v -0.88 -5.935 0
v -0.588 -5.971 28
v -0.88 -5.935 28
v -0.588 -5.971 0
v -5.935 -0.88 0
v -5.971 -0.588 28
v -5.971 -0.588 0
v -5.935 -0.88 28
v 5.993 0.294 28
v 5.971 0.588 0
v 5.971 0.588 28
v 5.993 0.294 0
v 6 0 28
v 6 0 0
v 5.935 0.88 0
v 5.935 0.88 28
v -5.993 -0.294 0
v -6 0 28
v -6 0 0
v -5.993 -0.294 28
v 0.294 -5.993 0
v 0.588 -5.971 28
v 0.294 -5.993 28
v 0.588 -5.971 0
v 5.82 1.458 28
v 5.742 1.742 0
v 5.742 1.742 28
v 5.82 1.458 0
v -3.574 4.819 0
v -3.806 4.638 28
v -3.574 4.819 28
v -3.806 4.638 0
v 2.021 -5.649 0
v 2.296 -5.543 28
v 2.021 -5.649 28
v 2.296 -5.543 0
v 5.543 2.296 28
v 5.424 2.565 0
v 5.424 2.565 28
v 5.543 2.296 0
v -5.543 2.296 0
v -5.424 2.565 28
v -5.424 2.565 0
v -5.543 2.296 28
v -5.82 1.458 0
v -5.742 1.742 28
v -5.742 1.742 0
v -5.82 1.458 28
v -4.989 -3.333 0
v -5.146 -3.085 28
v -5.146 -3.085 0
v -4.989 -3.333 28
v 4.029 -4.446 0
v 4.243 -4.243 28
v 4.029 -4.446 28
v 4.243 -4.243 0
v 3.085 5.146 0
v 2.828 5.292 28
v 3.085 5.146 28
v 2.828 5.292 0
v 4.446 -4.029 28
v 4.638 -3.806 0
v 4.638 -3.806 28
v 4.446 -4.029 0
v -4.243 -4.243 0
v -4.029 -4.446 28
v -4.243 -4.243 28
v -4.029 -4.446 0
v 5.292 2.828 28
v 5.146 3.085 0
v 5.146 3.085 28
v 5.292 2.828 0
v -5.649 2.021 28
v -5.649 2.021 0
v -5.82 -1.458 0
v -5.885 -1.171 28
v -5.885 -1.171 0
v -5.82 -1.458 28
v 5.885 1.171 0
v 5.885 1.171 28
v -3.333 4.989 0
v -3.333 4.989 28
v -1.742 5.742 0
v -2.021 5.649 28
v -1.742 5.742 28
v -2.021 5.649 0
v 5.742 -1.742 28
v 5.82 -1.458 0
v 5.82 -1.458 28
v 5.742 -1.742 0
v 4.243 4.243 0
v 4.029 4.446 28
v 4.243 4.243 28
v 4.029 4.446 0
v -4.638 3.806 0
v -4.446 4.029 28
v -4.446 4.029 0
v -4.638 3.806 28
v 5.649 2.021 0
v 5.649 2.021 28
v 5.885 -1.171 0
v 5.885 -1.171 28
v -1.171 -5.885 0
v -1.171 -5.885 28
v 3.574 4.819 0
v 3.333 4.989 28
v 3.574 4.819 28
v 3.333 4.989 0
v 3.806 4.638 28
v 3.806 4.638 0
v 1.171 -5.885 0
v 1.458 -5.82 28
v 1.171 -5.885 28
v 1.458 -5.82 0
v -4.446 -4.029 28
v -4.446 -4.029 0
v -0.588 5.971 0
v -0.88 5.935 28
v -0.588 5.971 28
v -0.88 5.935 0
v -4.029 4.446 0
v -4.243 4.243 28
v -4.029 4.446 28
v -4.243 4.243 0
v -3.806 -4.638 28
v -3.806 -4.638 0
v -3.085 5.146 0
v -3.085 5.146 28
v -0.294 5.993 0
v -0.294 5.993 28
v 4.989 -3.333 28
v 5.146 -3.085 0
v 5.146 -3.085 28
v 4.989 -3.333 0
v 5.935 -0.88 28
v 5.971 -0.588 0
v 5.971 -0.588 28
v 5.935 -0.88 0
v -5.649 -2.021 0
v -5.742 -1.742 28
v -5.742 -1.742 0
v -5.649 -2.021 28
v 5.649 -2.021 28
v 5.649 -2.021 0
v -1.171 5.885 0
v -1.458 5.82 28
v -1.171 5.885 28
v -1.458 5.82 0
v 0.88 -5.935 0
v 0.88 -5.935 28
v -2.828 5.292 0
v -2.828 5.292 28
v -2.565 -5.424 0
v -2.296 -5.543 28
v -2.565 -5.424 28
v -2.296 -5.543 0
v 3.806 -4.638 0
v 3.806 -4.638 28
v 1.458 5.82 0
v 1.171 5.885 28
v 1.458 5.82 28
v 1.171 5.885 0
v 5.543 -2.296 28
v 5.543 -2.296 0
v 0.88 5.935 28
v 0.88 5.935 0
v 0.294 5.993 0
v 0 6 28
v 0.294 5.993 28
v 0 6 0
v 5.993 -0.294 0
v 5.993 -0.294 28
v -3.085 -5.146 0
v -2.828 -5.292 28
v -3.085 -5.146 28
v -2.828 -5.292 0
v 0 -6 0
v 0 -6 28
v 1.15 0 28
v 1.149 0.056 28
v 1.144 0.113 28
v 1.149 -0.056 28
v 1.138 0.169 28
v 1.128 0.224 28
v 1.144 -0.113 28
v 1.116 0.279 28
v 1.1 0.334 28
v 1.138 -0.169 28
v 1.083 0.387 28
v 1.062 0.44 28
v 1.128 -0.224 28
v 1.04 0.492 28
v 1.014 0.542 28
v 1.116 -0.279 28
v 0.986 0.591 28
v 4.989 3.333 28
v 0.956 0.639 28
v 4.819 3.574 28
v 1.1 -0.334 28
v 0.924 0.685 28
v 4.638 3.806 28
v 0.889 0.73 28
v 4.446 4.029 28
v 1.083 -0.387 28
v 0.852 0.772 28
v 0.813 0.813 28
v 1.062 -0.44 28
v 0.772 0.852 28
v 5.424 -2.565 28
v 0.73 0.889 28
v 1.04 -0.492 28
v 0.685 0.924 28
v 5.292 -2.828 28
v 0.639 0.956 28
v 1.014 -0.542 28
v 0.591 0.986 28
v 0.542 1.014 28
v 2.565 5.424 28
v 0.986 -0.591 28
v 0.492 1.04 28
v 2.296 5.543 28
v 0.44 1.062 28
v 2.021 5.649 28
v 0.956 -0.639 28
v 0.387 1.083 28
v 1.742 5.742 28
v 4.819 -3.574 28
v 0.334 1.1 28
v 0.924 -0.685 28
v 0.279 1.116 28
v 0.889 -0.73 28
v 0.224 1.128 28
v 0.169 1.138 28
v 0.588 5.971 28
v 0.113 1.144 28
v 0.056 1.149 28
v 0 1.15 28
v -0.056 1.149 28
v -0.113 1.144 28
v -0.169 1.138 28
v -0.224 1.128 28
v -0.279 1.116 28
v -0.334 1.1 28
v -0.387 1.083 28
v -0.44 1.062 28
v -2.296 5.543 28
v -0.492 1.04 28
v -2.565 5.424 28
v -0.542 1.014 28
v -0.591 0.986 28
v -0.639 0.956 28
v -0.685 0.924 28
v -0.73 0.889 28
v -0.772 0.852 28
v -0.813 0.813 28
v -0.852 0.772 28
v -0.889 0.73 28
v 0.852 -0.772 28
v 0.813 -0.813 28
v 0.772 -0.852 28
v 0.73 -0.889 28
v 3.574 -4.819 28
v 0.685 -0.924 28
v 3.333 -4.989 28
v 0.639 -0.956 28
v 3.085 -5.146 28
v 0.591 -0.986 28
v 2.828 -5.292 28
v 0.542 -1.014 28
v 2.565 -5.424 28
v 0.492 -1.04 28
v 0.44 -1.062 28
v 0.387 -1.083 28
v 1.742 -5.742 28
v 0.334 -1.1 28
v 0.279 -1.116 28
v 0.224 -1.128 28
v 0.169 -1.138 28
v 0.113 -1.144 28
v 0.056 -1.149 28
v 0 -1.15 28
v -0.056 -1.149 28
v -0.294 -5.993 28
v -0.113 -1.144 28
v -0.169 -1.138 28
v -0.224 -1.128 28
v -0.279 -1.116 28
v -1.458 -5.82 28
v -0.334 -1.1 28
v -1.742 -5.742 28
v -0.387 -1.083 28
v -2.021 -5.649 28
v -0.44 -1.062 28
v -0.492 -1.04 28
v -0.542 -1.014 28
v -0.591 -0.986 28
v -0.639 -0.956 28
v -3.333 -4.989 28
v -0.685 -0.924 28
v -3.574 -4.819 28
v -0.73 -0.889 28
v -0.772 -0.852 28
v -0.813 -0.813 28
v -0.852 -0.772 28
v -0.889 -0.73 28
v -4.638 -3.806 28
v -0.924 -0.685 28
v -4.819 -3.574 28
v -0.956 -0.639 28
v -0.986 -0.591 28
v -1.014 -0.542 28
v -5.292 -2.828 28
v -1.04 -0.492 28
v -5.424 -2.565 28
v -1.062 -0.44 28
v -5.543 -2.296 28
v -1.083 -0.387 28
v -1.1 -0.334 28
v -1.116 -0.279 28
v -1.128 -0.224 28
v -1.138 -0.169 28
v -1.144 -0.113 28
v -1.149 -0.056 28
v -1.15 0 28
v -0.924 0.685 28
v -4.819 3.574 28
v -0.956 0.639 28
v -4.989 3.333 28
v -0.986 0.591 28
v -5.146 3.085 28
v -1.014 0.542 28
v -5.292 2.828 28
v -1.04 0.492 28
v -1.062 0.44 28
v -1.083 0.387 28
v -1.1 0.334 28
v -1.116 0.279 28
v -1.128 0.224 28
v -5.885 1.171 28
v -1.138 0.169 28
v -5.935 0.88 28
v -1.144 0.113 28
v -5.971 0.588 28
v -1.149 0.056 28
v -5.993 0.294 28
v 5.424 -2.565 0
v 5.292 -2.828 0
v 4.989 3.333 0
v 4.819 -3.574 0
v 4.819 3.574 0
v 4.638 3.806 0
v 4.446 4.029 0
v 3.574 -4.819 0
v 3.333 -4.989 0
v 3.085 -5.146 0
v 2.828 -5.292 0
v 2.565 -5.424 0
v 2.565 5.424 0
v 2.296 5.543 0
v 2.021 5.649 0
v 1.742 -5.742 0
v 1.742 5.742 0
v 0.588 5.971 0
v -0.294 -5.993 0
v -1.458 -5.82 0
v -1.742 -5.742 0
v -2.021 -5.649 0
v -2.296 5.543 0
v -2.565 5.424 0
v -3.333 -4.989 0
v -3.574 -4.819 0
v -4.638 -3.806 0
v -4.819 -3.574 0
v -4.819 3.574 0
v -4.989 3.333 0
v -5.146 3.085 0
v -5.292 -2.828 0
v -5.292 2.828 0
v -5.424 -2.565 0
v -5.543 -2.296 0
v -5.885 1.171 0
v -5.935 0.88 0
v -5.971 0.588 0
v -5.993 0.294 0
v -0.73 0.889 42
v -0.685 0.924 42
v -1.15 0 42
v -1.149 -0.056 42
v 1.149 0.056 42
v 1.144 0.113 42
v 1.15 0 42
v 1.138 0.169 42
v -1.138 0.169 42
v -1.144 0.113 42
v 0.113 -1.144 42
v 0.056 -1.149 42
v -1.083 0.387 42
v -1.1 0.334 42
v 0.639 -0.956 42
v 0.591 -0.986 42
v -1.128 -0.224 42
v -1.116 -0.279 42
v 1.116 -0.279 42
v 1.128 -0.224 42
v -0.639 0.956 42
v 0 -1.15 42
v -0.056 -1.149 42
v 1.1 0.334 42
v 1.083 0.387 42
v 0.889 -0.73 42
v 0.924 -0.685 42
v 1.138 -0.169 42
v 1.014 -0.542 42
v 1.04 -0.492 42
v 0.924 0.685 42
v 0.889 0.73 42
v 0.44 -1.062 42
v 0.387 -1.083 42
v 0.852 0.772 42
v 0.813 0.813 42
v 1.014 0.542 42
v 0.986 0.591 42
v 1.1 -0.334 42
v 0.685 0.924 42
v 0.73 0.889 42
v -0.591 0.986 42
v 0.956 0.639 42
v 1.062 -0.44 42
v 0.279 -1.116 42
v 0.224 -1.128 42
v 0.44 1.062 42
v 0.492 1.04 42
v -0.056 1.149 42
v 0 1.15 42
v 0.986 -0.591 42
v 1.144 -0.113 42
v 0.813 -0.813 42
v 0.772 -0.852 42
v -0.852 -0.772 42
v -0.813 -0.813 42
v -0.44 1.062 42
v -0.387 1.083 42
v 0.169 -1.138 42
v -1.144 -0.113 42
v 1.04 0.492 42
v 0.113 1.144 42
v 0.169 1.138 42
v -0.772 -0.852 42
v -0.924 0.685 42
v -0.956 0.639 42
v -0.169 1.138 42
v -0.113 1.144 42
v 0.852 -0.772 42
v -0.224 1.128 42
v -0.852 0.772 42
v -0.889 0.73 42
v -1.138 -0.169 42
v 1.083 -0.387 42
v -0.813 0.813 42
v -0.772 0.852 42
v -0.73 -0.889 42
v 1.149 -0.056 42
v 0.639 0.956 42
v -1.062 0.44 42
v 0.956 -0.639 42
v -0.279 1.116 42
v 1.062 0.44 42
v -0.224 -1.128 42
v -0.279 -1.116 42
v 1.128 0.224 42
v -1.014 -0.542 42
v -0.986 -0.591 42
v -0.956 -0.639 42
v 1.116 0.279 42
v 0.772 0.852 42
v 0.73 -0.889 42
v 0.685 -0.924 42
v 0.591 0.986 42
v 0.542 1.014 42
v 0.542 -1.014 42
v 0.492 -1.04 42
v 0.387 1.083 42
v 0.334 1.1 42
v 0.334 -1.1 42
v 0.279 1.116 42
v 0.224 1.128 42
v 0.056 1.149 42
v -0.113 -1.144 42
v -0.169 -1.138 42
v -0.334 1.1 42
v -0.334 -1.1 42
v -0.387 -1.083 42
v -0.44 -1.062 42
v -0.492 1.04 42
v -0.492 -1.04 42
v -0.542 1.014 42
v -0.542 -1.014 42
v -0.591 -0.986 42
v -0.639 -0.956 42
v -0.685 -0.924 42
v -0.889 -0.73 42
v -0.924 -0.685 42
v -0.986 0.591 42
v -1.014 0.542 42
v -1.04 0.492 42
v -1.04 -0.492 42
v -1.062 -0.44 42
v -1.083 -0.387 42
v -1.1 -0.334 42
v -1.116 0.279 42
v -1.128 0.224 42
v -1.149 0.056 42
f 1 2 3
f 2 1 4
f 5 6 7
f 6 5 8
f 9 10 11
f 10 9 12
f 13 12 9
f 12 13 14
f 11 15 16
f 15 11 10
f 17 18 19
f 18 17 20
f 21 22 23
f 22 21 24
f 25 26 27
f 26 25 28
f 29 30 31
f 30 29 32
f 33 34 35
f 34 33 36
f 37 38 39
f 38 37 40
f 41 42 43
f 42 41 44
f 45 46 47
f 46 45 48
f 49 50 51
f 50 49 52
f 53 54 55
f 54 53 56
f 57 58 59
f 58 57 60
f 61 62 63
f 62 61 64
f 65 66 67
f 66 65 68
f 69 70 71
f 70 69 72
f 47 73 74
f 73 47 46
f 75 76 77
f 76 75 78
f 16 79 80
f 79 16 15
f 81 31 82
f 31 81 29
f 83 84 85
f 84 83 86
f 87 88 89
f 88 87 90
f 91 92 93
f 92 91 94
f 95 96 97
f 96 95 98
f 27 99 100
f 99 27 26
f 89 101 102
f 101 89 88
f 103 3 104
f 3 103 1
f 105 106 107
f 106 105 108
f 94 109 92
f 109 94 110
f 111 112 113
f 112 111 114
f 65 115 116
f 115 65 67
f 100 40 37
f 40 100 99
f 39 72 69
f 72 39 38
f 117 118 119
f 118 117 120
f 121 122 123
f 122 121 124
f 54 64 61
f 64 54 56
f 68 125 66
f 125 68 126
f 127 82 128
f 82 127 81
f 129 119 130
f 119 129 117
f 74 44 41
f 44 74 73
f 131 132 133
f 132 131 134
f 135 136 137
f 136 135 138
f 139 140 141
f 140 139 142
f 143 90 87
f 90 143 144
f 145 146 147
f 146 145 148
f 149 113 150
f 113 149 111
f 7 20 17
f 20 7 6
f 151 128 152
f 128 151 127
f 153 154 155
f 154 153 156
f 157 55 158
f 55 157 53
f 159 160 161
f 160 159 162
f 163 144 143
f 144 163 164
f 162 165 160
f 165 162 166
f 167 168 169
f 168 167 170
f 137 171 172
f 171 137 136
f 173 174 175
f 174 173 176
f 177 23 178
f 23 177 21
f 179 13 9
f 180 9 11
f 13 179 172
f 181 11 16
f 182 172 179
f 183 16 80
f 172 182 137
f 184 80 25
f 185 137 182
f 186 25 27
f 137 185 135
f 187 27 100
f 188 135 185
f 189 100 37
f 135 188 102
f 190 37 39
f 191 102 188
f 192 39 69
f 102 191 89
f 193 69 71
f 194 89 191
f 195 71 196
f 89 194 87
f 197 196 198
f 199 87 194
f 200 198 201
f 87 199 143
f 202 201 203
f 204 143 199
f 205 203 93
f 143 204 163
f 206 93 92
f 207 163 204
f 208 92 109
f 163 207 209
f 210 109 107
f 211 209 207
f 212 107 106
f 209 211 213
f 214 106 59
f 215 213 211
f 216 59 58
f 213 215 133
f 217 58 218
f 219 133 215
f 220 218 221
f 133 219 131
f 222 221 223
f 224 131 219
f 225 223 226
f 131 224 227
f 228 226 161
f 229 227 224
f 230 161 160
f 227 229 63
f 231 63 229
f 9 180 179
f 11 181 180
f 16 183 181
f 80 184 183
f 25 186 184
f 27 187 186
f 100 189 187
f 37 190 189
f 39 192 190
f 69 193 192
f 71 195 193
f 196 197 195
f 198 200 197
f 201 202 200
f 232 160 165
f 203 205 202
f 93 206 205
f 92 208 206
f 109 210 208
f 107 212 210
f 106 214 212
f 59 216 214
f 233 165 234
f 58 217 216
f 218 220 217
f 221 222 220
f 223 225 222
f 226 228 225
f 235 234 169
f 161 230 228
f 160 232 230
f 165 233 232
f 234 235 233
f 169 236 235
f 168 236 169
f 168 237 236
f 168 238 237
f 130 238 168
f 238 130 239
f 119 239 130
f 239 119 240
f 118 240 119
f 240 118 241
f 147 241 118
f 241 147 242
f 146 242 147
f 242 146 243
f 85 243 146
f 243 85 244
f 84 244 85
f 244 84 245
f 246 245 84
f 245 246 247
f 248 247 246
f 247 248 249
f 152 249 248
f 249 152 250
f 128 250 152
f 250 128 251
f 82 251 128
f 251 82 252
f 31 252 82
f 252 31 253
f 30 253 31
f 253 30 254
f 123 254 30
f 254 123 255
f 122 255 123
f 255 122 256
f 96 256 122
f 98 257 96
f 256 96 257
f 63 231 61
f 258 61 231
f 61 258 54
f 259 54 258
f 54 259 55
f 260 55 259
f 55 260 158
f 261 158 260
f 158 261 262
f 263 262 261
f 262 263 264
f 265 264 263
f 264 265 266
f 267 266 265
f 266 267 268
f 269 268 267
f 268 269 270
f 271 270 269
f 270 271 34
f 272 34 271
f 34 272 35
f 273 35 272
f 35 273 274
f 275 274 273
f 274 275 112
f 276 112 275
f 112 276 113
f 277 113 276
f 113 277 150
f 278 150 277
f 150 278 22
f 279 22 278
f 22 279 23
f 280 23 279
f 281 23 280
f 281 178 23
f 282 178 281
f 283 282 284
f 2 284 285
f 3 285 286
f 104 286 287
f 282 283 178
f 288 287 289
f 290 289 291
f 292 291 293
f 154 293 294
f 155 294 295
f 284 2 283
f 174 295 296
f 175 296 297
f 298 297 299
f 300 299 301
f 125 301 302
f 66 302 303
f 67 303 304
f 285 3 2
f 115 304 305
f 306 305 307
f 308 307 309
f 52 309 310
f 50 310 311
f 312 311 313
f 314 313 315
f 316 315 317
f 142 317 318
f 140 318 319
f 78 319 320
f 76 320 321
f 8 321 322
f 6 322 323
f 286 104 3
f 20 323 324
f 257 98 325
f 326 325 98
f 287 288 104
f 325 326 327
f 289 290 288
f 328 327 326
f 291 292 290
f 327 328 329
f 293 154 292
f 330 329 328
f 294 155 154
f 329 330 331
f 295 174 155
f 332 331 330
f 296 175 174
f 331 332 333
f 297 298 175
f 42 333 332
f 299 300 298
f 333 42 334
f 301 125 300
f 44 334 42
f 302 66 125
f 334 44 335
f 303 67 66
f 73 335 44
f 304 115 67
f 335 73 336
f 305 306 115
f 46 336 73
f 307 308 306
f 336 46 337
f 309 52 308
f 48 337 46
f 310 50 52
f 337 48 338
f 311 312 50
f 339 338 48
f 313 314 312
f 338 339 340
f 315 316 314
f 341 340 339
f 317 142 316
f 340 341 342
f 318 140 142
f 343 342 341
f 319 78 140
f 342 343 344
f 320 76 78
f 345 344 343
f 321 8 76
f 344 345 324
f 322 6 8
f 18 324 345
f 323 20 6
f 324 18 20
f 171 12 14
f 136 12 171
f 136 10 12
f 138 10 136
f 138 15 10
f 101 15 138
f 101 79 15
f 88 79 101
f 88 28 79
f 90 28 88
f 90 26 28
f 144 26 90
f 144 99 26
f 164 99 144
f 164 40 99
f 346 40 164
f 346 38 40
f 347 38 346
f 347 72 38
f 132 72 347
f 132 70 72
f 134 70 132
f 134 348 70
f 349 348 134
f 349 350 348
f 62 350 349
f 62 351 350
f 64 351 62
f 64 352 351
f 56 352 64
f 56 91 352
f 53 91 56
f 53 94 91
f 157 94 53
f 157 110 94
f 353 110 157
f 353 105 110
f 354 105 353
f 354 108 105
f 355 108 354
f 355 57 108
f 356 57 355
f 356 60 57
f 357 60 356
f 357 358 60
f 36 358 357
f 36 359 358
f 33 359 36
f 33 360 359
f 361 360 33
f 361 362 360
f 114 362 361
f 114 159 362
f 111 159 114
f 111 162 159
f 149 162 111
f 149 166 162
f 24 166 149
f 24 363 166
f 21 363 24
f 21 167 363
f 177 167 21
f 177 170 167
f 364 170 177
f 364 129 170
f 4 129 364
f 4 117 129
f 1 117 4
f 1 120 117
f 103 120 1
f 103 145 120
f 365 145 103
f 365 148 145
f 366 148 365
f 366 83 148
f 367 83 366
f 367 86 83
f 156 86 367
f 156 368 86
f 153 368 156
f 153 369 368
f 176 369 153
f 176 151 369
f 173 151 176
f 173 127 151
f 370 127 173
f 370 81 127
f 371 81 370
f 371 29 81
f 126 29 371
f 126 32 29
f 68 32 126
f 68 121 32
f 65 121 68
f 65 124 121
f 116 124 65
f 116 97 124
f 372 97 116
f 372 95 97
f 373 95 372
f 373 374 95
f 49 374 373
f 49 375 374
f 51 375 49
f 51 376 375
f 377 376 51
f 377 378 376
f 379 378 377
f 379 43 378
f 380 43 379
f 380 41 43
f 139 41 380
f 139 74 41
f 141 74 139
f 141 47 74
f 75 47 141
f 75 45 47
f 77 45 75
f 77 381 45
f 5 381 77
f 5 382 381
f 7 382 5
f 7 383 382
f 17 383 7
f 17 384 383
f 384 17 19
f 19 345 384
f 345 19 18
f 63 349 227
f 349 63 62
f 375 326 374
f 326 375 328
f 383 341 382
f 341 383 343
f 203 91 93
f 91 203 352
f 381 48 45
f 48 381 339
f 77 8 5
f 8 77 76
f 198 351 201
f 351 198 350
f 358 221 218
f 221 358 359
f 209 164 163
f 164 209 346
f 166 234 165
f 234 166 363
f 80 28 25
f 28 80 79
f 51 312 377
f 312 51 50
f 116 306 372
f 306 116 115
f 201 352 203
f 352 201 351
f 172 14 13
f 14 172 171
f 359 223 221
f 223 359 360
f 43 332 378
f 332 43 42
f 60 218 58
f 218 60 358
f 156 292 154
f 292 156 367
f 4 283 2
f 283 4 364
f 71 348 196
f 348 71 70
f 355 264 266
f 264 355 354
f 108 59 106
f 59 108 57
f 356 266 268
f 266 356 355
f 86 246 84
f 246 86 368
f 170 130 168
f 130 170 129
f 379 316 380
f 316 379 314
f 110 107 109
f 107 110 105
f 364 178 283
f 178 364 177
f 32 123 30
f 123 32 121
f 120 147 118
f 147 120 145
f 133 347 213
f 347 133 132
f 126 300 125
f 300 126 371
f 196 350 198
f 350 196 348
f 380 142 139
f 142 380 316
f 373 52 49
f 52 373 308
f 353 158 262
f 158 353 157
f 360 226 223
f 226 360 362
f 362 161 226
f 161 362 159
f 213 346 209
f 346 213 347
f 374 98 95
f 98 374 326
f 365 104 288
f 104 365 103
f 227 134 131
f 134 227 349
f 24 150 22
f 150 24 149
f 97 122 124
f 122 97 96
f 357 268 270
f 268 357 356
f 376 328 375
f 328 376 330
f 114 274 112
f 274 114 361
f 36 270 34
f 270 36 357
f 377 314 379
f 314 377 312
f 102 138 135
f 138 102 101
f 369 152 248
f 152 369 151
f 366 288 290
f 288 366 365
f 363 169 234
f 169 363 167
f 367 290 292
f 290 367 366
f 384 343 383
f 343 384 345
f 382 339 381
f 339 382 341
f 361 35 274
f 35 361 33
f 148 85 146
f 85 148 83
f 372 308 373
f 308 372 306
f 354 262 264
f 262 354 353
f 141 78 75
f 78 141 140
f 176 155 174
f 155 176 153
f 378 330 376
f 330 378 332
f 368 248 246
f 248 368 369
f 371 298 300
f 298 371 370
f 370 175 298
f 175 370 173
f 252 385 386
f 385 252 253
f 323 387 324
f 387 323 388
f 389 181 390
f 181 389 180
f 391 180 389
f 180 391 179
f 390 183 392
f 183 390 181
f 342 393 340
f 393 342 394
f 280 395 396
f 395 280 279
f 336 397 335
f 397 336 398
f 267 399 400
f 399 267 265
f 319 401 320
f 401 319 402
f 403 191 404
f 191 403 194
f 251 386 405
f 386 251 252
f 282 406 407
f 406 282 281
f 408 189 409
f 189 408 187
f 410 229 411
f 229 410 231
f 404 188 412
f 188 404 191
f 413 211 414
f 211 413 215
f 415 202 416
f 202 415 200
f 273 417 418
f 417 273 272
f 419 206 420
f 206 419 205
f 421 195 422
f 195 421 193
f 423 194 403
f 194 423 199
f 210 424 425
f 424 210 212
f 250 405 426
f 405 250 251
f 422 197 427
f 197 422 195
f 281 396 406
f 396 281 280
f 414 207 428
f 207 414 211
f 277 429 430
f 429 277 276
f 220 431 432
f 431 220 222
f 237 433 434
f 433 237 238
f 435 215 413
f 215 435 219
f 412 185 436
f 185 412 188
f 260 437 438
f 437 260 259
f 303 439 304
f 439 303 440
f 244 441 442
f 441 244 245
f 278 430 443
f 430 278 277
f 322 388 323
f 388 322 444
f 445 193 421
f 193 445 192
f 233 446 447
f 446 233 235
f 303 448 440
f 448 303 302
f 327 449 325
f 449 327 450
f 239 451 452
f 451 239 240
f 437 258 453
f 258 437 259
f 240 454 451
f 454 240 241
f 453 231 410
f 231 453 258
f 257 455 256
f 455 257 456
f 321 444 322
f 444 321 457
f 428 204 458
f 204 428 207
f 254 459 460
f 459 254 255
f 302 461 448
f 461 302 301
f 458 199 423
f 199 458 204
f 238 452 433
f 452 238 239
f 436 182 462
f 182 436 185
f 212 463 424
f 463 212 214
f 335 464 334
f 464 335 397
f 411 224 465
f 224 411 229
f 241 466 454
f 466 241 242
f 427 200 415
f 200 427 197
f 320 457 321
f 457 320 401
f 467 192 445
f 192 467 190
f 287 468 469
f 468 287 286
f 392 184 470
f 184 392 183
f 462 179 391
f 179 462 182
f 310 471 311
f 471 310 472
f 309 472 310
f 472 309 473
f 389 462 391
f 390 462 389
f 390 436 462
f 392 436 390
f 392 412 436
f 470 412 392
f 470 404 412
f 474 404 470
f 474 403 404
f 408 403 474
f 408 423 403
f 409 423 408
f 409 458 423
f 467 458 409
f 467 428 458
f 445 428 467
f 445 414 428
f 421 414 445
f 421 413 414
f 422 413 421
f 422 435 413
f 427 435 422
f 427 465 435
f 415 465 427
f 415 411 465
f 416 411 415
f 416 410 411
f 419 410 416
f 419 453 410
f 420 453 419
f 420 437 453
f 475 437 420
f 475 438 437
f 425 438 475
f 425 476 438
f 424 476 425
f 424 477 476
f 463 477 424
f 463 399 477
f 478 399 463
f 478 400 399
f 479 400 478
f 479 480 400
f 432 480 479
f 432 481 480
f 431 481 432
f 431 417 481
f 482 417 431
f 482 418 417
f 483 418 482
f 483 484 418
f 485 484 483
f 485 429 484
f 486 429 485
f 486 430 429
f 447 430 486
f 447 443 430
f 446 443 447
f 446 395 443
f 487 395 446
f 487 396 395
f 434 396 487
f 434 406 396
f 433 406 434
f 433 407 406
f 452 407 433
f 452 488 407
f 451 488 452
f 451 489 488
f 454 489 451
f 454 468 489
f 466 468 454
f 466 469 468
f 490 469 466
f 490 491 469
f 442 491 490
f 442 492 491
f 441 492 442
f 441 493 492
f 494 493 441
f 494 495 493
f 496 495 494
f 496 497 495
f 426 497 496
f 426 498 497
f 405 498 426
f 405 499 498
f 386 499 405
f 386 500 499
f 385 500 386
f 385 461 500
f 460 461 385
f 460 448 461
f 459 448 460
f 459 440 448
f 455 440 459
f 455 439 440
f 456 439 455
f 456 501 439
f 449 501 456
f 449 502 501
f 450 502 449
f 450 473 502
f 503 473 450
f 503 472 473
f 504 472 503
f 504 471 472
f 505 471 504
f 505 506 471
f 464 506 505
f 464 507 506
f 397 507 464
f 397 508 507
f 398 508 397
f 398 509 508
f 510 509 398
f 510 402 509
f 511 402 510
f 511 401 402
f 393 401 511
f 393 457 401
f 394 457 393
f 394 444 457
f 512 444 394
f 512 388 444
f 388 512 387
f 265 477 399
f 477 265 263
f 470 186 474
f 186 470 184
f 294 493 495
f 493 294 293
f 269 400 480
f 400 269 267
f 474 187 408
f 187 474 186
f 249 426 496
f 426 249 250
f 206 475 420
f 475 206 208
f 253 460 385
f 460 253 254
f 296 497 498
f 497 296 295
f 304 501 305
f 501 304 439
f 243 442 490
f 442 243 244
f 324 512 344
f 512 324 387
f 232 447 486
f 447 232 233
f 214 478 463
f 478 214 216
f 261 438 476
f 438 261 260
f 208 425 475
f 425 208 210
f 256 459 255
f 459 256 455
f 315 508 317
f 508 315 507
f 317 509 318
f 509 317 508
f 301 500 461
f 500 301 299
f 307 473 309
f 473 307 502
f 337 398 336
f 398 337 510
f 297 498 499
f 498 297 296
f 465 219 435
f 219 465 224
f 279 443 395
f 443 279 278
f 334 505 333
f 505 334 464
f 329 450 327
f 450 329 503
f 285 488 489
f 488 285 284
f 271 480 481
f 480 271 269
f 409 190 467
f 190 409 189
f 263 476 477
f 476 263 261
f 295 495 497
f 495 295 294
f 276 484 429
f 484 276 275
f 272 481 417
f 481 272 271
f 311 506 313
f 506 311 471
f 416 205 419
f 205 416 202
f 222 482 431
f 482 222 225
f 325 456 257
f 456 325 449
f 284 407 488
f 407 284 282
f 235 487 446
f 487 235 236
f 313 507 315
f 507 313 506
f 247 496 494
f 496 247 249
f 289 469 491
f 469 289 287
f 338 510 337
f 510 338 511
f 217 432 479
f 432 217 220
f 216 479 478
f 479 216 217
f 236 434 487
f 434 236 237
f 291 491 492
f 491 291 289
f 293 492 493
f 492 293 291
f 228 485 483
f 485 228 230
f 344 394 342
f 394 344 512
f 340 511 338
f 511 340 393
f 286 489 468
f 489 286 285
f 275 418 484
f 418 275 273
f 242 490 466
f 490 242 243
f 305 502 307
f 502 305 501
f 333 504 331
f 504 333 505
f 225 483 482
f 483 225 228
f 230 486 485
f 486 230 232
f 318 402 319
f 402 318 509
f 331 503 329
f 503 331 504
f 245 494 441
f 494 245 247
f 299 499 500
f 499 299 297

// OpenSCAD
// Isolated v3: fit-first pin for the centered completed connector target.
// Dimensions in millimetres; receiving CAD remains unchanged.
total_length = 42;
shaft_length = 14;
shaft_diameter = 2.3;
grip_diameter = 12;
grip_length = 28;
$fn = 128;
union() {
    cylinder(h = grip_length, d = grip_diameter);
    translate([0, 0, grip_length - 0.01])
        cylinder(h = shaft_length + 0.01, d = shaft_diameter);
}
